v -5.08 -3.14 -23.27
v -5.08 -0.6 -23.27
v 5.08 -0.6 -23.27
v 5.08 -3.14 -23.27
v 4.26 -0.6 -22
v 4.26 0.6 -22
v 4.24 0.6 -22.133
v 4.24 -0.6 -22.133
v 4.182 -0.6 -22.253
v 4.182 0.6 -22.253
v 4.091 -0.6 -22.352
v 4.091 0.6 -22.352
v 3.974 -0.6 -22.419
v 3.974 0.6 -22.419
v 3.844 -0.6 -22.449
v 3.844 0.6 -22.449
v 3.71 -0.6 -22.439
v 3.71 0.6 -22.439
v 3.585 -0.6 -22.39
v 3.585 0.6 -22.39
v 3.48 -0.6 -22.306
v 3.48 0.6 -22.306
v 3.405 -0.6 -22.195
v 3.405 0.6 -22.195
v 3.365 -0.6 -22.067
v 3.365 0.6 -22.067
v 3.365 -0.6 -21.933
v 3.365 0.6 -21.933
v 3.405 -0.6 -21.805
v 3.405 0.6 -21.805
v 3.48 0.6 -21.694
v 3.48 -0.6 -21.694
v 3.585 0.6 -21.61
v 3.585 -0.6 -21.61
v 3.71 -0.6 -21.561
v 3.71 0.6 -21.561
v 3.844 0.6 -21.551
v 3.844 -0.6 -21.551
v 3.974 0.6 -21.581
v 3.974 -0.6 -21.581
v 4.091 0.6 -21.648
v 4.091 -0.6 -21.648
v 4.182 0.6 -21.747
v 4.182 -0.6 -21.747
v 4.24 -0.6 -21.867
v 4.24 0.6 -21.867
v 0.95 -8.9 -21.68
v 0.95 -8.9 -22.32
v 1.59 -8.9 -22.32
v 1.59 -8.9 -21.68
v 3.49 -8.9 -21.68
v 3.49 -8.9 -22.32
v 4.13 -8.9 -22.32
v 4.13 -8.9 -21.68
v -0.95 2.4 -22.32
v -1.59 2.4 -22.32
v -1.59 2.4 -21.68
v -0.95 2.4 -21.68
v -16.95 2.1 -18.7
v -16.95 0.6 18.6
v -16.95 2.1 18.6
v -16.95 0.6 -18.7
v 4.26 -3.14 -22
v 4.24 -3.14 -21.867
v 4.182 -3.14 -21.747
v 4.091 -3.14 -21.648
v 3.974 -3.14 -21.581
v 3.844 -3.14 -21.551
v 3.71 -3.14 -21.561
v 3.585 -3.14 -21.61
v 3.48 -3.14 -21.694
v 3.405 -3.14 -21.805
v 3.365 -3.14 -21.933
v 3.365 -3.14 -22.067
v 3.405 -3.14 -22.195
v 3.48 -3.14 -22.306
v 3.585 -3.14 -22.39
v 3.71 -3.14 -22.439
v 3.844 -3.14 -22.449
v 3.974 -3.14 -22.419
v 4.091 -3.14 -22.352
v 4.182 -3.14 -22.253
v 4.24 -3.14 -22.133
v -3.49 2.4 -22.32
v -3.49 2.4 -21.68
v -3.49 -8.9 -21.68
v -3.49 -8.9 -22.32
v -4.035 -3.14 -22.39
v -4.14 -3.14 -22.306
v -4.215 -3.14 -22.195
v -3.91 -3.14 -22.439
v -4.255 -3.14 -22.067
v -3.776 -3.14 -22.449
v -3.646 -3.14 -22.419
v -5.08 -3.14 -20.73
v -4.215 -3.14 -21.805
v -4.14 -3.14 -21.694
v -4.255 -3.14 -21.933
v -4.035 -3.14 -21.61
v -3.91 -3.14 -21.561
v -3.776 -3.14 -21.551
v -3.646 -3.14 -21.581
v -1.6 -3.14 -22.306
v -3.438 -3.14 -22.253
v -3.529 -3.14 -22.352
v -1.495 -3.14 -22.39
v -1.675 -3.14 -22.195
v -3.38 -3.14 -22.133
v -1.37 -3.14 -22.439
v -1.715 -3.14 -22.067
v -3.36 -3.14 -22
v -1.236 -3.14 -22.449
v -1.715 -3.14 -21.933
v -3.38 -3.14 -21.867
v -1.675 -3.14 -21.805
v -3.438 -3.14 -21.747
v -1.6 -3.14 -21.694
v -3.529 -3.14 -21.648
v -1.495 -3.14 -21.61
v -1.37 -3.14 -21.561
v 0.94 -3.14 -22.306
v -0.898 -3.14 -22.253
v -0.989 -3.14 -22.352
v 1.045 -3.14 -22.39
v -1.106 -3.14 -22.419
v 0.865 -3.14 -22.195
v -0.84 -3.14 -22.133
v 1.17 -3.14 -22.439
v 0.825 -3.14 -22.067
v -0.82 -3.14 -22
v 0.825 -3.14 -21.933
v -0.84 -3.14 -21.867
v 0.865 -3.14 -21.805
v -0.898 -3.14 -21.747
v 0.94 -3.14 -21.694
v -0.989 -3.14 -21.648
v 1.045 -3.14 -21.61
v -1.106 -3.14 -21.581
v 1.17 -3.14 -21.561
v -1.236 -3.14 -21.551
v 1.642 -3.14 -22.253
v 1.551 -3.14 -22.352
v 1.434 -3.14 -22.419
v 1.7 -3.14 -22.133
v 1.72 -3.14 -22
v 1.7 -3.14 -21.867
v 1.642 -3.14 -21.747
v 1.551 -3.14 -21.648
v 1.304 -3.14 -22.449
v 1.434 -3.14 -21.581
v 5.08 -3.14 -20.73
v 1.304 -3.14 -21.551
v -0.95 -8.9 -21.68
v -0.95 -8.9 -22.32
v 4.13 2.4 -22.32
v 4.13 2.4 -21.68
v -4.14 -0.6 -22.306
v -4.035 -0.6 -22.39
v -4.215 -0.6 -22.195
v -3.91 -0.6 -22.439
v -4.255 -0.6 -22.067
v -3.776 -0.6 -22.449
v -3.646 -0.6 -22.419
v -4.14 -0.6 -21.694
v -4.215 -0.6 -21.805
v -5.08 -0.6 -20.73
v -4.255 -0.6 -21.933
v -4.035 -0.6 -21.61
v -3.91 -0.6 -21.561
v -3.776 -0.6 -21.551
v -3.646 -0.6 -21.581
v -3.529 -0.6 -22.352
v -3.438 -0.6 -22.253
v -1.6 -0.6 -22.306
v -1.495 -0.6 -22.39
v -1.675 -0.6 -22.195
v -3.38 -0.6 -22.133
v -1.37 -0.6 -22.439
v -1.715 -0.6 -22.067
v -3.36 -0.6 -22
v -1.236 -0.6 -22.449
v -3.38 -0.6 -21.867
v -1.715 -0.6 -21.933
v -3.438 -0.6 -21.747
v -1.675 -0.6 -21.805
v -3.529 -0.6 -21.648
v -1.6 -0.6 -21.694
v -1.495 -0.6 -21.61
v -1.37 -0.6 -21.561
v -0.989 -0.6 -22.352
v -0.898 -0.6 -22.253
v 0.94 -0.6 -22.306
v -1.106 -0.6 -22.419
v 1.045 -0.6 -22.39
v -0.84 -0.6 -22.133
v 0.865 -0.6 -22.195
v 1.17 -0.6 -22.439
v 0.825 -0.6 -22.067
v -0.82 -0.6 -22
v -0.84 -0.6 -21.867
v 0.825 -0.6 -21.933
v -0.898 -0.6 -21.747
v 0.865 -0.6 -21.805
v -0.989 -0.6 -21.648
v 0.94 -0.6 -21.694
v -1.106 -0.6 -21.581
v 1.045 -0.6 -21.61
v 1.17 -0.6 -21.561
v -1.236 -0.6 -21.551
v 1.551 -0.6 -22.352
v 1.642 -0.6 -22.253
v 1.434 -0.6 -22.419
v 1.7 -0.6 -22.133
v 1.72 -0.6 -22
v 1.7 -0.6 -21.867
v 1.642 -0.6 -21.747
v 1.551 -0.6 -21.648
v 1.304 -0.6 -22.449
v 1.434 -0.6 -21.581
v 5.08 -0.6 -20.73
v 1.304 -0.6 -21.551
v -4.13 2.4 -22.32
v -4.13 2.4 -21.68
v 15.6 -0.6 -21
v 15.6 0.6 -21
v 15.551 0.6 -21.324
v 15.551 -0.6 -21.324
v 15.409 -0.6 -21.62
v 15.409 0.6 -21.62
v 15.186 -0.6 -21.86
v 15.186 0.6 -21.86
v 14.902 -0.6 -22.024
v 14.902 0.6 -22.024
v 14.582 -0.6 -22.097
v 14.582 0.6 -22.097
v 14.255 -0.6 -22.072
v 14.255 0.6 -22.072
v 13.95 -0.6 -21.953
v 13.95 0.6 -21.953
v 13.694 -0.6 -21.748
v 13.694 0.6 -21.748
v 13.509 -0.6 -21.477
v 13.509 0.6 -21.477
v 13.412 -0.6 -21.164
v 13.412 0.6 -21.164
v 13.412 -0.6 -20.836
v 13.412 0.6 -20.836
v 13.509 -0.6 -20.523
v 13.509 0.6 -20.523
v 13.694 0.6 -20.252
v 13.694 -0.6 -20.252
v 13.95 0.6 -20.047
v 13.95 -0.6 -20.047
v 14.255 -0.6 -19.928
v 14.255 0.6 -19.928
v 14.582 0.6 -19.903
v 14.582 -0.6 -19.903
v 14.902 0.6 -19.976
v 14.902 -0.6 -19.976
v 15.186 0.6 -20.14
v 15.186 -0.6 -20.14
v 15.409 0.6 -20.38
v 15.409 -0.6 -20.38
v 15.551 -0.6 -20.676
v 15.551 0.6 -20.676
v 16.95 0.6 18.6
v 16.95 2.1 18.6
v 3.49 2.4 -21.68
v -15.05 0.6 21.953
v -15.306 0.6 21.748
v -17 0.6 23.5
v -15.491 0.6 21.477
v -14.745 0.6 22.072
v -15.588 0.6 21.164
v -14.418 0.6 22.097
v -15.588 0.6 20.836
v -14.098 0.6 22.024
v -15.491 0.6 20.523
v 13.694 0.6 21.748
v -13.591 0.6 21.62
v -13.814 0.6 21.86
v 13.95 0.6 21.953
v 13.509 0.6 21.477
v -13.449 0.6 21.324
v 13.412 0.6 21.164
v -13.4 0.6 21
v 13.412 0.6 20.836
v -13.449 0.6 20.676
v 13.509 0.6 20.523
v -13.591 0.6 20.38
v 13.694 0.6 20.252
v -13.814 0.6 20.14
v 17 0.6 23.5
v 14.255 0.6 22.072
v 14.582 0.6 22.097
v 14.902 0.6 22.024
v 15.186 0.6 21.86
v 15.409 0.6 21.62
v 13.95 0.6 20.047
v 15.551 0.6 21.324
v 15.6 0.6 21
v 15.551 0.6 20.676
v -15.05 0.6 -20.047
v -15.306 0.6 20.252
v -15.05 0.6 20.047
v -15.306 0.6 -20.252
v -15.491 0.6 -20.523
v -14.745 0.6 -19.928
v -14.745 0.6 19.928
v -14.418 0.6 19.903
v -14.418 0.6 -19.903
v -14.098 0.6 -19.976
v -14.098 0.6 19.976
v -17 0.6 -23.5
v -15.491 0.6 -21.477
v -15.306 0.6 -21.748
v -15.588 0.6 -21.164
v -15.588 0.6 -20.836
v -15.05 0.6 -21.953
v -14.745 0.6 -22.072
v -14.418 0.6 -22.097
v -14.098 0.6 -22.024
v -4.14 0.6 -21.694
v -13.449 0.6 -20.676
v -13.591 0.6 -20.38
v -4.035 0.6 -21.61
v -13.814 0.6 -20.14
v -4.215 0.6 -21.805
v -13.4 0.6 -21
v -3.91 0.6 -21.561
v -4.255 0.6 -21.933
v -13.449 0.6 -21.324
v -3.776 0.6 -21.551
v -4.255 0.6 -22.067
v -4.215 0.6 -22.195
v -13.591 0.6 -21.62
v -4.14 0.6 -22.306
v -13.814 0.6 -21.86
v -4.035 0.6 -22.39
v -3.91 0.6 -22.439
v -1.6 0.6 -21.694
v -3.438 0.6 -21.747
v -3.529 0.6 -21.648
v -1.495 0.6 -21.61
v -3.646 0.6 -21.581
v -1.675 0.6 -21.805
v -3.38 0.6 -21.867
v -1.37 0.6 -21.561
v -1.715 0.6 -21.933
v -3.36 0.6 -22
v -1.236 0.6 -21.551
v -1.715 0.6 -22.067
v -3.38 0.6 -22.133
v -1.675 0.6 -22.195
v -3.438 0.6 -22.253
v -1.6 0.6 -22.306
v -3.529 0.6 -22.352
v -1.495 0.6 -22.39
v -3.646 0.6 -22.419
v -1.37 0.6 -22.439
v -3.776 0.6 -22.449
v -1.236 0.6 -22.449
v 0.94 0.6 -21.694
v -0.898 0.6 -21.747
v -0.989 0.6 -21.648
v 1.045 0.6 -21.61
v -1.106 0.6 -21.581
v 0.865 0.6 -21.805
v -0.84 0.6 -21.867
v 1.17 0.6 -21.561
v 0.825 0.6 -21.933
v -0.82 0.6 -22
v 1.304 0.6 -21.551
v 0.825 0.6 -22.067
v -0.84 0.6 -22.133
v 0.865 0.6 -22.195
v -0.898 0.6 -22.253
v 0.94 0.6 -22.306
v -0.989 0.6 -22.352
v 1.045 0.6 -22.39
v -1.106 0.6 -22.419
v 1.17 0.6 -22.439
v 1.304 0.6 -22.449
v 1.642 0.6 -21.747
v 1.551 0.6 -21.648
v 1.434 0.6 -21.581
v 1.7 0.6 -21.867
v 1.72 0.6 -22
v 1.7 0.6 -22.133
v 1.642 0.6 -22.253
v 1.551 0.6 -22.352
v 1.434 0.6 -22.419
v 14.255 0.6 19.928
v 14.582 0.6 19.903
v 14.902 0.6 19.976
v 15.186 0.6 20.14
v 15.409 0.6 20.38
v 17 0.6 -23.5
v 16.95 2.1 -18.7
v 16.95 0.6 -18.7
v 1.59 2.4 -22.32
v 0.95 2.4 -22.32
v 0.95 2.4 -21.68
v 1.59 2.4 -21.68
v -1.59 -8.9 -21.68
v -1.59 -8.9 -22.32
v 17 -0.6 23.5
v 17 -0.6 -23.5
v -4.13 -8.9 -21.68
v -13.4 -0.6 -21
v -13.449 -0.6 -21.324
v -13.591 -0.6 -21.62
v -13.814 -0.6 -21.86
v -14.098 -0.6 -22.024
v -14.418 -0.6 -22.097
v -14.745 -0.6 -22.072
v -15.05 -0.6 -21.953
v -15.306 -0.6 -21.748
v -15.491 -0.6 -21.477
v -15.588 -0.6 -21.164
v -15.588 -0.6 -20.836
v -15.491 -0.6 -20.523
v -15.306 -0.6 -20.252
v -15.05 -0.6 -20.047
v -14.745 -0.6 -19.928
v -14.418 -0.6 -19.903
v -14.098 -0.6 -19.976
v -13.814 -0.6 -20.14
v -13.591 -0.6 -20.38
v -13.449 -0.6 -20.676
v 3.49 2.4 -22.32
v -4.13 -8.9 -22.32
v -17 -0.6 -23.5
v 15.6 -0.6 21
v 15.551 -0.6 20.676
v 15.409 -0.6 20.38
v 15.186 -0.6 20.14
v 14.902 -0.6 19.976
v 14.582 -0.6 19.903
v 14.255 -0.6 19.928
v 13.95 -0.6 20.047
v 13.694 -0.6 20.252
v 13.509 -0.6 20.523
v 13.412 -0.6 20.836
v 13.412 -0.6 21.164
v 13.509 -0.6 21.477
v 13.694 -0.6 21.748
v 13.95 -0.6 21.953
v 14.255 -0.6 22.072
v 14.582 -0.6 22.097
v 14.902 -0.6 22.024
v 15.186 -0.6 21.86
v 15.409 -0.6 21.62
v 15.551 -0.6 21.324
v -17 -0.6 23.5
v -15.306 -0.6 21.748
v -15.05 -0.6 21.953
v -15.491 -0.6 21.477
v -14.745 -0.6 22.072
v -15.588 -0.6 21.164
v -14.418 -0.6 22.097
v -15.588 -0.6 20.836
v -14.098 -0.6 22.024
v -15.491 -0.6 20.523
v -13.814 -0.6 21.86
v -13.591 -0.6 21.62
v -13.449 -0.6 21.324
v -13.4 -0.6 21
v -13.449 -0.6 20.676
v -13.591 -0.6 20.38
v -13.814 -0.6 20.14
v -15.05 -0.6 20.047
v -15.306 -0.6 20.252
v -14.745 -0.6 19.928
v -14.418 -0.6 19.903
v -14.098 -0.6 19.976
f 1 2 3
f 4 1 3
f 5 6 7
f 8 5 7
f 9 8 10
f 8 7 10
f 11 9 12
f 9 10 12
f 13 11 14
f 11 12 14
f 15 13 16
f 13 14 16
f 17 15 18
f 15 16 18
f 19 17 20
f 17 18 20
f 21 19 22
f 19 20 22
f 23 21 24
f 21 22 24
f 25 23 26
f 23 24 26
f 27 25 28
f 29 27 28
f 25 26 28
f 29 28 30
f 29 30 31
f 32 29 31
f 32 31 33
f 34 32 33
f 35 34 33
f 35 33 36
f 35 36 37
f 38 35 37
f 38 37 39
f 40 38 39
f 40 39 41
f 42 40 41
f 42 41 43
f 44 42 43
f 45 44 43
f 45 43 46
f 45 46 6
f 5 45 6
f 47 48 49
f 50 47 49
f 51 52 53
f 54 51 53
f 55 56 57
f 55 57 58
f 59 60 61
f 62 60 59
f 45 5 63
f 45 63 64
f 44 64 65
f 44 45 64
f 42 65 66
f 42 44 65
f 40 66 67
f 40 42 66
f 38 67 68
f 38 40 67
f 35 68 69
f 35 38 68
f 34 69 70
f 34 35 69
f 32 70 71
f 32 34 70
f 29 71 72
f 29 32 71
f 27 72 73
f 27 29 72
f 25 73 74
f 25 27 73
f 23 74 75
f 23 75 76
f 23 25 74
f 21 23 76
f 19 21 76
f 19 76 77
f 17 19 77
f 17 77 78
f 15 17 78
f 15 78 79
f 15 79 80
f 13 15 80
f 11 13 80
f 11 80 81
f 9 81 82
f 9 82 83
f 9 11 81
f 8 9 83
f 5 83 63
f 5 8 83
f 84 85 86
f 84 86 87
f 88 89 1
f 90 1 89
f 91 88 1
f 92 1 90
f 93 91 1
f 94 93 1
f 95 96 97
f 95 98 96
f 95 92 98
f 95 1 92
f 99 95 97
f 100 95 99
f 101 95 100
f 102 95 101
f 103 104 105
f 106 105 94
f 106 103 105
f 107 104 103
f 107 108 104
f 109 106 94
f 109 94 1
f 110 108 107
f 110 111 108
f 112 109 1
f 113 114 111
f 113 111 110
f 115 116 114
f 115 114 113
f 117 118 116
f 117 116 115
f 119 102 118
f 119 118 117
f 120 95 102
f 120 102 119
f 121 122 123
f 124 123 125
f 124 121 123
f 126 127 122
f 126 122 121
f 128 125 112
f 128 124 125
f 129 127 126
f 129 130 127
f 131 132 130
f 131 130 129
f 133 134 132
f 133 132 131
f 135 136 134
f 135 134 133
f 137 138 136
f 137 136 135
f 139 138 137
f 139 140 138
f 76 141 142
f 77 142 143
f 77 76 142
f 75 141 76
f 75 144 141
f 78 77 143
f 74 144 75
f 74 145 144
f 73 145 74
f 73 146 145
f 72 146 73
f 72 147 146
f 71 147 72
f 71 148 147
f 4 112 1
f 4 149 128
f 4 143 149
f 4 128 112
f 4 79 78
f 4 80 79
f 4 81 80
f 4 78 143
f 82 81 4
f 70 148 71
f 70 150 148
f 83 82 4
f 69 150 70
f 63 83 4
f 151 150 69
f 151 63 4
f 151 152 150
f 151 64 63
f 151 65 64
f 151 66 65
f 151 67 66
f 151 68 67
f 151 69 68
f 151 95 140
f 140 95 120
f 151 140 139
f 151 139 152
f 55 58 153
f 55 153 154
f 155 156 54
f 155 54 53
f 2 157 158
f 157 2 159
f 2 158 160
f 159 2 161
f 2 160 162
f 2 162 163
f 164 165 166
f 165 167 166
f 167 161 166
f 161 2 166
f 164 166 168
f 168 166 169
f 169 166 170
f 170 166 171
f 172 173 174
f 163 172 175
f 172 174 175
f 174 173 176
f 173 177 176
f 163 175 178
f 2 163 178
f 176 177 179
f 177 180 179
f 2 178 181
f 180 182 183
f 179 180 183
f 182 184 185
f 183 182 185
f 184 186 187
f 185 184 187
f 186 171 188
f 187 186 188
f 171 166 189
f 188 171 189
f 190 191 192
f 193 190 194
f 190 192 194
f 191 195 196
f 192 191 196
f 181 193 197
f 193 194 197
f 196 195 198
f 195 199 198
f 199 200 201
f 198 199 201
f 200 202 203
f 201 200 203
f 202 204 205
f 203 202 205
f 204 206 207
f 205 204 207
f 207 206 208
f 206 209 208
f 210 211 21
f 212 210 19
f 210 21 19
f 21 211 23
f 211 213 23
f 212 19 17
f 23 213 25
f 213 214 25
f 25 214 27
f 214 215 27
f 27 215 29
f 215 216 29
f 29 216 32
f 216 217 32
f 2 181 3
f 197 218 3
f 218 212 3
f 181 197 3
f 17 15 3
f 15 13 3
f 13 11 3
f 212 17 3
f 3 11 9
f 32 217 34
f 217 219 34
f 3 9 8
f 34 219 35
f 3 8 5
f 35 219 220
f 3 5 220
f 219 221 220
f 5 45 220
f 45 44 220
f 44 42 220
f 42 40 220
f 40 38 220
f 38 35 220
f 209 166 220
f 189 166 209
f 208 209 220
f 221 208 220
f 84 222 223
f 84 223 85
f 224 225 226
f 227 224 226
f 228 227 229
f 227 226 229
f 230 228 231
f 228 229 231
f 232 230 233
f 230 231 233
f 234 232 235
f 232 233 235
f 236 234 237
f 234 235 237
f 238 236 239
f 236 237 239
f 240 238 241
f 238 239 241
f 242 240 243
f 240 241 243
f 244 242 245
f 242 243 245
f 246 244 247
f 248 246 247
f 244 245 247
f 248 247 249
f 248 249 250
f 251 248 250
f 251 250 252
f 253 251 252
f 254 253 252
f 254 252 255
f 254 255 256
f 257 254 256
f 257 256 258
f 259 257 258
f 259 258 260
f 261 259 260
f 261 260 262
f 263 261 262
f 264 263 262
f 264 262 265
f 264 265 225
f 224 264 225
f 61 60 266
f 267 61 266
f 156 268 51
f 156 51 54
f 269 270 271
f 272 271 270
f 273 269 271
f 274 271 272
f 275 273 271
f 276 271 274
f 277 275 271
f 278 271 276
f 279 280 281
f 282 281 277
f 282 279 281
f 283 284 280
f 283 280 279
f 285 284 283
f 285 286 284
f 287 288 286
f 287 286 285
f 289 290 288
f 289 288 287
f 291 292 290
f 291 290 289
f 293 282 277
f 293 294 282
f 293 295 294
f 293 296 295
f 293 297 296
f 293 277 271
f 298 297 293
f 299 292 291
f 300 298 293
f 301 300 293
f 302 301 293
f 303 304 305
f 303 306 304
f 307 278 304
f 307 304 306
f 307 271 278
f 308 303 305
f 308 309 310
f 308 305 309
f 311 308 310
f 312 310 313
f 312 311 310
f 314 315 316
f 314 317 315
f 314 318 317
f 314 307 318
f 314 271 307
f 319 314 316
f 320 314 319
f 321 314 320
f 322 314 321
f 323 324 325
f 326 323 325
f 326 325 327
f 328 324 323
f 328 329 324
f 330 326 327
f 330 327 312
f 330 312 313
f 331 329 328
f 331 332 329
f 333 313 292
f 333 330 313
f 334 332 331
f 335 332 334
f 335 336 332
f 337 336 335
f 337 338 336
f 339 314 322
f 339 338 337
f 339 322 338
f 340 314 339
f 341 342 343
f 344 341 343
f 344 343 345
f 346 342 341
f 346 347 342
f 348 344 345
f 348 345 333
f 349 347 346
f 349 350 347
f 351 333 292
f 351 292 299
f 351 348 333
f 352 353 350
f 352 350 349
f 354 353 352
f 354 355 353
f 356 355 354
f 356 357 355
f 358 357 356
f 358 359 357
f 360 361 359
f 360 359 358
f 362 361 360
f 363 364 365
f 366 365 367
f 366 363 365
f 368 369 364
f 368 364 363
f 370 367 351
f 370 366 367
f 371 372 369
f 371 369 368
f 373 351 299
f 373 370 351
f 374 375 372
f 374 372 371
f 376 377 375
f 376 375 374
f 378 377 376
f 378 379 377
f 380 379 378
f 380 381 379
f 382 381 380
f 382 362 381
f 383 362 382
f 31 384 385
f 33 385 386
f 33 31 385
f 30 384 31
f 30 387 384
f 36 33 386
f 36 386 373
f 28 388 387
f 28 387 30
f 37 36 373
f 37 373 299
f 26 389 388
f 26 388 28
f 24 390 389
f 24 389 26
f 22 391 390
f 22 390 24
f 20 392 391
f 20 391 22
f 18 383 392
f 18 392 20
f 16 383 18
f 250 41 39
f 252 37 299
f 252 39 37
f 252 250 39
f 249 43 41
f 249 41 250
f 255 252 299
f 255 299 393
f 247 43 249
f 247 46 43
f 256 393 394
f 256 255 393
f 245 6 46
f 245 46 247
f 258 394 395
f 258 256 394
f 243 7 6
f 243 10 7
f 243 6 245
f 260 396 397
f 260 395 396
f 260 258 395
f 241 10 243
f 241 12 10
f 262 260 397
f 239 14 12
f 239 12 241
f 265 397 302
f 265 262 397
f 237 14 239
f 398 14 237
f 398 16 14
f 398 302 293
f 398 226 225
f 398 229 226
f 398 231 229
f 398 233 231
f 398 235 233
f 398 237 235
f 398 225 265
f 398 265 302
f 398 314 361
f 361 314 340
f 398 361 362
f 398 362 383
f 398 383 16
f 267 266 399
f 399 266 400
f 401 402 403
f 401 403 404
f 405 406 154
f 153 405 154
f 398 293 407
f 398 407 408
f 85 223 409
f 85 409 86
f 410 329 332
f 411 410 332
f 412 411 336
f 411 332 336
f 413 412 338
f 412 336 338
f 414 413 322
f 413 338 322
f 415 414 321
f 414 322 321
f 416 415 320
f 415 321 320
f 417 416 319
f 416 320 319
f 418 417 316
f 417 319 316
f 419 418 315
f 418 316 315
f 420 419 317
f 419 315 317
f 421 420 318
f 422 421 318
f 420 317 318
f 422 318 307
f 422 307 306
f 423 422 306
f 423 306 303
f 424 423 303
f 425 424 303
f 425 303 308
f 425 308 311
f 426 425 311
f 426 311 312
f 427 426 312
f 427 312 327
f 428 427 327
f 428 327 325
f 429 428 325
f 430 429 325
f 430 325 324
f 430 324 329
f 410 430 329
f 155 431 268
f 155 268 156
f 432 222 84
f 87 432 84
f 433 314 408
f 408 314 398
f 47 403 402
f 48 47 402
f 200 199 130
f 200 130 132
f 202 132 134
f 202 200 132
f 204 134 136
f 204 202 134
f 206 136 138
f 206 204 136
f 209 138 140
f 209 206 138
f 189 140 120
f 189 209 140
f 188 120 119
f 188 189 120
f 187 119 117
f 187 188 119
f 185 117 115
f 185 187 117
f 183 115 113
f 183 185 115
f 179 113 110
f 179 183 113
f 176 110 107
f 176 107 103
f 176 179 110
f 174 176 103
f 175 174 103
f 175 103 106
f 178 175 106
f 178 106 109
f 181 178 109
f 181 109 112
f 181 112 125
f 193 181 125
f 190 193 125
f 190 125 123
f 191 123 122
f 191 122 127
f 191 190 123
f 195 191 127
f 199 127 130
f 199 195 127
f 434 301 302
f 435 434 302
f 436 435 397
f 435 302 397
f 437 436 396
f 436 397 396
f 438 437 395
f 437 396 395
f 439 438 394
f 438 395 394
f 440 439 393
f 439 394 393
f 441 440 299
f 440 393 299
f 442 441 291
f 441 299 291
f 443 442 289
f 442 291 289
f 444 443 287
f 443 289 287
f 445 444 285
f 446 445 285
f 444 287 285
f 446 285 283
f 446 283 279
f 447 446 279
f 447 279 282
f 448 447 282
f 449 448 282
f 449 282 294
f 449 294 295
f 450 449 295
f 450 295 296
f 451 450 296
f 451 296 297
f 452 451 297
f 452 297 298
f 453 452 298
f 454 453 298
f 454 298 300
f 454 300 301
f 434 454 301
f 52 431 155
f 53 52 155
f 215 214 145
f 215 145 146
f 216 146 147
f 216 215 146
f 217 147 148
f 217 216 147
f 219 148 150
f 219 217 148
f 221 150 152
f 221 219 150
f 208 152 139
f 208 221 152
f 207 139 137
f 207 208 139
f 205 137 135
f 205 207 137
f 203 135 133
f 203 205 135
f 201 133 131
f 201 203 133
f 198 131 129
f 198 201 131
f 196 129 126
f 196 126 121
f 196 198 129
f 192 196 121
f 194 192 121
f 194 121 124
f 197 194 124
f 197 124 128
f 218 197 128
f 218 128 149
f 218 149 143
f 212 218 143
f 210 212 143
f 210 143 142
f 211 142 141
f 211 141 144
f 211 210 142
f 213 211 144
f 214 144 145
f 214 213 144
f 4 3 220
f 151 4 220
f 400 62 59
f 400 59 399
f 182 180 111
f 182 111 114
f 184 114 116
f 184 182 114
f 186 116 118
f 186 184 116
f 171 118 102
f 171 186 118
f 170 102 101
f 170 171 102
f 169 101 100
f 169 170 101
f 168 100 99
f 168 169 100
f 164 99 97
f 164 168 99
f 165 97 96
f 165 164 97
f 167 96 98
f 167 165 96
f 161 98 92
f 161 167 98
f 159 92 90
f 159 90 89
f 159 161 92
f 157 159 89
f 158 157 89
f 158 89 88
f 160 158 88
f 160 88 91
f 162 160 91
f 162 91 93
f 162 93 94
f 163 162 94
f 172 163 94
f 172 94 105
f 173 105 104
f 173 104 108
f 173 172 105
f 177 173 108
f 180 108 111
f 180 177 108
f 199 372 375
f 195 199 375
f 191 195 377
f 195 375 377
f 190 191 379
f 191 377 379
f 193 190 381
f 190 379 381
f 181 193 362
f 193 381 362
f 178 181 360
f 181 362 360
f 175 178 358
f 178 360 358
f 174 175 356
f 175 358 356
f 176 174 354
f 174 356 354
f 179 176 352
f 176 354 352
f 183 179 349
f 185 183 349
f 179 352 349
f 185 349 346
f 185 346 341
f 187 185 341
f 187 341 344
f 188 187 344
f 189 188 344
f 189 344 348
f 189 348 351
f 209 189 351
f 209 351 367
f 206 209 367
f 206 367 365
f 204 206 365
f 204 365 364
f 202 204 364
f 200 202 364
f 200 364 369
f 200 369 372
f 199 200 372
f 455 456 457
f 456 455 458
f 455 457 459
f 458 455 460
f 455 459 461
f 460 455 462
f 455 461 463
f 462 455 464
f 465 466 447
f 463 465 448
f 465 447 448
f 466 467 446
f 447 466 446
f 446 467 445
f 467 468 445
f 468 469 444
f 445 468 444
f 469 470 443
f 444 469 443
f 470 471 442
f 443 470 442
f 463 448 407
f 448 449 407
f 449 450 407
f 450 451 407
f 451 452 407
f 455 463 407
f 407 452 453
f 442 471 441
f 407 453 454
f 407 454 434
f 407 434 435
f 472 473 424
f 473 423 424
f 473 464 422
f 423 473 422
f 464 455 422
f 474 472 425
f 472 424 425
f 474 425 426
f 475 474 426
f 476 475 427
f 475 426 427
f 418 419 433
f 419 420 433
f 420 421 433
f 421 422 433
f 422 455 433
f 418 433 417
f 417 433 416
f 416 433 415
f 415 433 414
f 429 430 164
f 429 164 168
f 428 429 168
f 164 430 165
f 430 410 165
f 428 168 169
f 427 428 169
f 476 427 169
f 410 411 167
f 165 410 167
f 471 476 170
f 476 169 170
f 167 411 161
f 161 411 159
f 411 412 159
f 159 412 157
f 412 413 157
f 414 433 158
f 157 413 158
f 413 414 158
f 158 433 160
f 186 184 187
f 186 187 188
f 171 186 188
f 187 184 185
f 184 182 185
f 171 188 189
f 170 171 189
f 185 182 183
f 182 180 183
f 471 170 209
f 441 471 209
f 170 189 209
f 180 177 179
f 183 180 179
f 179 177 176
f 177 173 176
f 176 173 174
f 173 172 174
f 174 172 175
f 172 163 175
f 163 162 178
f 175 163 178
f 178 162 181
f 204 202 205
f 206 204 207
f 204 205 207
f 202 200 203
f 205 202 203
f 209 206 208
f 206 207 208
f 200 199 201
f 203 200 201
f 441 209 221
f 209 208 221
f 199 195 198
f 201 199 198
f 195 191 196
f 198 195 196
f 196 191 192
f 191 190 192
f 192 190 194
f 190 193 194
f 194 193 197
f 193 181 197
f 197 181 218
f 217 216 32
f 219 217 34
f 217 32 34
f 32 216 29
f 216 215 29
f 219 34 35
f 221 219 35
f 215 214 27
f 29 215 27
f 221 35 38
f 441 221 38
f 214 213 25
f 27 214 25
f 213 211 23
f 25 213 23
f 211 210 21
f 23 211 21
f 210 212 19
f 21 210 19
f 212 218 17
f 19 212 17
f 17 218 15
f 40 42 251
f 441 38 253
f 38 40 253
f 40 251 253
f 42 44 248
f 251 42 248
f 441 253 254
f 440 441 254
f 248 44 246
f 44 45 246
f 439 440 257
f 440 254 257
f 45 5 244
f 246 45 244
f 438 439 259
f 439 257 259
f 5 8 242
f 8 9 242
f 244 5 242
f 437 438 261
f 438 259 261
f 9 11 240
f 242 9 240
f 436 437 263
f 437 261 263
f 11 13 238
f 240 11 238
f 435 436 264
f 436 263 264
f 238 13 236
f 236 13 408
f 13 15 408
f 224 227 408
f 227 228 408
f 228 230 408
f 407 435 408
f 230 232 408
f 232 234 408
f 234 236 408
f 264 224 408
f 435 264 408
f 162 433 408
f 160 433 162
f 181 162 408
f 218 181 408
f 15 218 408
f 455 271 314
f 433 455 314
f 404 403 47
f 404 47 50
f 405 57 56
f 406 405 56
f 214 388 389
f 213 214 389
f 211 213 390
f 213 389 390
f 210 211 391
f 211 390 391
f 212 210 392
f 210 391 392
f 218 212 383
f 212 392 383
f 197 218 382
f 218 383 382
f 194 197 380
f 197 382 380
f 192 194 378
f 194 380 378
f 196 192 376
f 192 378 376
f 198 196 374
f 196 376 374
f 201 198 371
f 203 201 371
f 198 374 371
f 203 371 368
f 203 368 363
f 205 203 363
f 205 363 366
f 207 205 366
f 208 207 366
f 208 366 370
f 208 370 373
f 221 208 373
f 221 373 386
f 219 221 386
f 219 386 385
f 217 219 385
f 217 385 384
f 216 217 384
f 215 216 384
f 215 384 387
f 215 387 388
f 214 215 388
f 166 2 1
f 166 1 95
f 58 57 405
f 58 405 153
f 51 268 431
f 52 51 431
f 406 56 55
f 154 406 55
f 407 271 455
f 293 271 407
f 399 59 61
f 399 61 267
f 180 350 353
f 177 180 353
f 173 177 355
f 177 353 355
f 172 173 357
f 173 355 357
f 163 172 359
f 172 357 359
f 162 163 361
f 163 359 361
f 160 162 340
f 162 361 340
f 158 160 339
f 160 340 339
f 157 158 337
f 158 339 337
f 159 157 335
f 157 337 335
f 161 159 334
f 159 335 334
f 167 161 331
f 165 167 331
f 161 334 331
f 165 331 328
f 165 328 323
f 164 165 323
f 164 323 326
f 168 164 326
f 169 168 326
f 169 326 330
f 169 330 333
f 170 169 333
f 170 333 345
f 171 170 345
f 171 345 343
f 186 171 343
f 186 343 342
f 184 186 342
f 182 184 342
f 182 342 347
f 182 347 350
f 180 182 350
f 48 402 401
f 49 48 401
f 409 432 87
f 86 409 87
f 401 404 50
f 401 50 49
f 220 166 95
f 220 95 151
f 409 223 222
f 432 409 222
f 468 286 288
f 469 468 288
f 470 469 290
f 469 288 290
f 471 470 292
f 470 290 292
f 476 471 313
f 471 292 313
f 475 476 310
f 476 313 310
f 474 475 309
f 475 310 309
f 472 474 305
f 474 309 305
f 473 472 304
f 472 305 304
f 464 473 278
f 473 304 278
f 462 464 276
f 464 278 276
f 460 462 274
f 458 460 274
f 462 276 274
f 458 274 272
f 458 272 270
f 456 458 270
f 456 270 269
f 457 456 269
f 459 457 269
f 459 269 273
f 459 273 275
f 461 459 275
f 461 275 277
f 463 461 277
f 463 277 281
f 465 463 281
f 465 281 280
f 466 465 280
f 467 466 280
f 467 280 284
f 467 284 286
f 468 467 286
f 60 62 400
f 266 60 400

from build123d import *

# Parameters (mm, degrees)
SKETCH1_W             = 34
SKETCH1_H             = 47
BOSS_EXTRUDE1_DEPTH   = 0.6
SKETCH2_R             = 1.1
CUT_EXTRUDE1_DEPTH    = 2.2
SKETCH3_R             = 0.45
CUT_EXTRUDE2_DEPTH    = 2.2
SKETCH4_W             = 10.16
SKETCH4_H             = 2.54
SKETCH4_R             = 0.45
BOSS_EXTRUDE2_DEPTH   = 2.54
BOSS_EXTRUDE3_START   = 1.8
SKETCH5_W             = 0.64
SKETCH5_H             = 0.64
BOSS_EXTRUDE3_DEPTH   = 11.3
BOSS_EXTRUDE3_2_DEPTH = 11.3
BOSS_EXTRUDE3_3_DEPTH = 11.3
BOSS_EXTRUDE3_4_DEPTH = 11.3
SKETCH6_W             = 33.9
SKETCH6_H             = 37.3
BOSS_EXTRUDE4_DEPTH   = 1.5


with BuildPart() as part:
    # Sketch1 → Boss-Extrude1 (new body, symmetric)
    with BuildSketch(Plane(origin=(0, 0, 0), x_dir=(1, 0, 0), z_dir=(0, 1, 0))):
        Rectangle(SKETCH1_W, SKETCH1_H)
    extrude(amount=BOSS_EXTRUDE1_DEPTH, both=True)

    # Sketch2 → Cut-Extrude1 (cut, through all)
    with BuildSketch(Plane(origin=(0, 0.6, 0), x_dir=(1, 0, 0), z_dir=(0, 1, 0))):
        with Locations((-14.5, 21)):
            Circle(SKETCH2_R)
        with Locations((14.5, 21)):
            Circle(SKETCH2_R)
        with Locations((14.5, -21)):
            Circle(SKETCH2_R)
        with Locations((-14.5, -21)):
            Circle(SKETCH2_R)
    extrude(amount=-CUT_EXTRUDE1_DEPTH, mode=Mode.SUBTRACT)

    # Sketch3 → Cut-Extrude2 (cut, through all)
    with BuildSketch(Plane(origin=(0, 0.6, 0), x_dir=(1, 0, 0), z_dir=(0, 1, 0))):
        with Locations((-3.81, 22)):
            Circle(SKETCH3_R)
        with Locations((-1.27, 22)):
            Circle(SKETCH3_R)
        with Locations((1.27, 22)):
            Circle(SKETCH3_R)
        with Locations((3.81, 22)):
            Circle(SKETCH3_R)
    extrude(amount=-CUT_EXTRUDE2_DEPTH, mode=Mode.SUBTRACT)


with BuildPart() as body_2:
    # Sketch4 → Boss-Extrude2 (new body)
    with BuildSketch(Plane.XZ.offset(0.6)):
        with Locations((0, -22)):
            Rectangle(SKETCH4_W, SKETCH4_H)
        with Locations((3.81, -22)):
            Circle(SKETCH4_R, mode=Mode.SUBTRACT)
        with Locations((1.27, -22)):
            Circle(SKETCH4_R, mode=Mode.SUBTRACT)
        with Locations((-1.27, -22)):
            Circle(SKETCH4_R, mode=Mode.SUBTRACT)
        with Locations((-3.81, -22)):
            Circle(SKETCH4_R, mode=Mode.SUBTRACT)
    extrude(amount=BOSS_EXTRUDE2_DEPTH)


with BuildPart() as body_3:
    # Sketch5 → Boss-Extrude3 (new body)
    with BuildSketch(Plane(origin=(0, 0.6, 0), x_dir=(1, 0, 0), z_dir=(0, 1, 0)).offset(BOSS_EXTRUDE3_START)):
        with Locations((-1.27, 22)):
            Rectangle(SKETCH5_W, SKETCH5_H)
    extrude(amount=-BOSS_EXTRUDE3_DEPTH)


with BuildPart() as body_4:
    # Sketch5 → Boss-Extrude3 2 (new body)
    with BuildSketch(Plane(origin=(0, 0.6, 0), x_dir=(1, 0, 0), z_dir=(0, 1, 0)).offset(BOSS_EXTRUDE3_START)):
        with Locations((-3.81, 22)):
            Rectangle(SKETCH5_W, SKETCH5_H)
    extrude(amount=-BOSS_EXTRUDE3_2_DEPTH)


with BuildPart() as body_5:
    # Sketch5 → Boss-Extrude3 3 (new body)
    with BuildSketch(Plane(origin=(0, 0.6, 0), x_dir=(1, 0, 0), z_dir=(0, 1, 0)).offset(BOSS_EXTRUDE3_START)):
        with Locations((1.27, 22)):
            Rectangle(SKETCH5_W, SKETCH5_H)
    extrude(amount=-BOSS_EXTRUDE3_3_DEPTH)


with BuildPart() as body_6:
    # Sketch5 → Boss-Extrude3 4 (new body)
    with BuildSketch(Plane(origin=(0, 0.6, 0), x_dir=(1, 0, 0), z_dir=(0, 1, 0)).offset(BOSS_EXTRUDE3_START)):
        with Locations((3.81, 22)):
            Rectangle(SKETCH5_W, SKETCH5_H)
    extrude(amount=-BOSS_EXTRUDE3_4_DEPTH)


with BuildPart() as body_7:
    # Sketch6 → Boss-Extrude4 (new body)
    with BuildSketch(Plane(origin=(0, 0.6, 0), x_dir=(1, 0, 0), z_dir=(0, 1, 0))):
        with Locations((0, 0.05)):
            Rectangle(SKETCH6_W, SKETCH6_H)
    extrude(amount=BOSS_EXTRUDE4_DEPTH)


solid = Compound([part.part, body_2.part, body_3.part, body_4.part, body_5.part, body_6.part, body_7.part])
